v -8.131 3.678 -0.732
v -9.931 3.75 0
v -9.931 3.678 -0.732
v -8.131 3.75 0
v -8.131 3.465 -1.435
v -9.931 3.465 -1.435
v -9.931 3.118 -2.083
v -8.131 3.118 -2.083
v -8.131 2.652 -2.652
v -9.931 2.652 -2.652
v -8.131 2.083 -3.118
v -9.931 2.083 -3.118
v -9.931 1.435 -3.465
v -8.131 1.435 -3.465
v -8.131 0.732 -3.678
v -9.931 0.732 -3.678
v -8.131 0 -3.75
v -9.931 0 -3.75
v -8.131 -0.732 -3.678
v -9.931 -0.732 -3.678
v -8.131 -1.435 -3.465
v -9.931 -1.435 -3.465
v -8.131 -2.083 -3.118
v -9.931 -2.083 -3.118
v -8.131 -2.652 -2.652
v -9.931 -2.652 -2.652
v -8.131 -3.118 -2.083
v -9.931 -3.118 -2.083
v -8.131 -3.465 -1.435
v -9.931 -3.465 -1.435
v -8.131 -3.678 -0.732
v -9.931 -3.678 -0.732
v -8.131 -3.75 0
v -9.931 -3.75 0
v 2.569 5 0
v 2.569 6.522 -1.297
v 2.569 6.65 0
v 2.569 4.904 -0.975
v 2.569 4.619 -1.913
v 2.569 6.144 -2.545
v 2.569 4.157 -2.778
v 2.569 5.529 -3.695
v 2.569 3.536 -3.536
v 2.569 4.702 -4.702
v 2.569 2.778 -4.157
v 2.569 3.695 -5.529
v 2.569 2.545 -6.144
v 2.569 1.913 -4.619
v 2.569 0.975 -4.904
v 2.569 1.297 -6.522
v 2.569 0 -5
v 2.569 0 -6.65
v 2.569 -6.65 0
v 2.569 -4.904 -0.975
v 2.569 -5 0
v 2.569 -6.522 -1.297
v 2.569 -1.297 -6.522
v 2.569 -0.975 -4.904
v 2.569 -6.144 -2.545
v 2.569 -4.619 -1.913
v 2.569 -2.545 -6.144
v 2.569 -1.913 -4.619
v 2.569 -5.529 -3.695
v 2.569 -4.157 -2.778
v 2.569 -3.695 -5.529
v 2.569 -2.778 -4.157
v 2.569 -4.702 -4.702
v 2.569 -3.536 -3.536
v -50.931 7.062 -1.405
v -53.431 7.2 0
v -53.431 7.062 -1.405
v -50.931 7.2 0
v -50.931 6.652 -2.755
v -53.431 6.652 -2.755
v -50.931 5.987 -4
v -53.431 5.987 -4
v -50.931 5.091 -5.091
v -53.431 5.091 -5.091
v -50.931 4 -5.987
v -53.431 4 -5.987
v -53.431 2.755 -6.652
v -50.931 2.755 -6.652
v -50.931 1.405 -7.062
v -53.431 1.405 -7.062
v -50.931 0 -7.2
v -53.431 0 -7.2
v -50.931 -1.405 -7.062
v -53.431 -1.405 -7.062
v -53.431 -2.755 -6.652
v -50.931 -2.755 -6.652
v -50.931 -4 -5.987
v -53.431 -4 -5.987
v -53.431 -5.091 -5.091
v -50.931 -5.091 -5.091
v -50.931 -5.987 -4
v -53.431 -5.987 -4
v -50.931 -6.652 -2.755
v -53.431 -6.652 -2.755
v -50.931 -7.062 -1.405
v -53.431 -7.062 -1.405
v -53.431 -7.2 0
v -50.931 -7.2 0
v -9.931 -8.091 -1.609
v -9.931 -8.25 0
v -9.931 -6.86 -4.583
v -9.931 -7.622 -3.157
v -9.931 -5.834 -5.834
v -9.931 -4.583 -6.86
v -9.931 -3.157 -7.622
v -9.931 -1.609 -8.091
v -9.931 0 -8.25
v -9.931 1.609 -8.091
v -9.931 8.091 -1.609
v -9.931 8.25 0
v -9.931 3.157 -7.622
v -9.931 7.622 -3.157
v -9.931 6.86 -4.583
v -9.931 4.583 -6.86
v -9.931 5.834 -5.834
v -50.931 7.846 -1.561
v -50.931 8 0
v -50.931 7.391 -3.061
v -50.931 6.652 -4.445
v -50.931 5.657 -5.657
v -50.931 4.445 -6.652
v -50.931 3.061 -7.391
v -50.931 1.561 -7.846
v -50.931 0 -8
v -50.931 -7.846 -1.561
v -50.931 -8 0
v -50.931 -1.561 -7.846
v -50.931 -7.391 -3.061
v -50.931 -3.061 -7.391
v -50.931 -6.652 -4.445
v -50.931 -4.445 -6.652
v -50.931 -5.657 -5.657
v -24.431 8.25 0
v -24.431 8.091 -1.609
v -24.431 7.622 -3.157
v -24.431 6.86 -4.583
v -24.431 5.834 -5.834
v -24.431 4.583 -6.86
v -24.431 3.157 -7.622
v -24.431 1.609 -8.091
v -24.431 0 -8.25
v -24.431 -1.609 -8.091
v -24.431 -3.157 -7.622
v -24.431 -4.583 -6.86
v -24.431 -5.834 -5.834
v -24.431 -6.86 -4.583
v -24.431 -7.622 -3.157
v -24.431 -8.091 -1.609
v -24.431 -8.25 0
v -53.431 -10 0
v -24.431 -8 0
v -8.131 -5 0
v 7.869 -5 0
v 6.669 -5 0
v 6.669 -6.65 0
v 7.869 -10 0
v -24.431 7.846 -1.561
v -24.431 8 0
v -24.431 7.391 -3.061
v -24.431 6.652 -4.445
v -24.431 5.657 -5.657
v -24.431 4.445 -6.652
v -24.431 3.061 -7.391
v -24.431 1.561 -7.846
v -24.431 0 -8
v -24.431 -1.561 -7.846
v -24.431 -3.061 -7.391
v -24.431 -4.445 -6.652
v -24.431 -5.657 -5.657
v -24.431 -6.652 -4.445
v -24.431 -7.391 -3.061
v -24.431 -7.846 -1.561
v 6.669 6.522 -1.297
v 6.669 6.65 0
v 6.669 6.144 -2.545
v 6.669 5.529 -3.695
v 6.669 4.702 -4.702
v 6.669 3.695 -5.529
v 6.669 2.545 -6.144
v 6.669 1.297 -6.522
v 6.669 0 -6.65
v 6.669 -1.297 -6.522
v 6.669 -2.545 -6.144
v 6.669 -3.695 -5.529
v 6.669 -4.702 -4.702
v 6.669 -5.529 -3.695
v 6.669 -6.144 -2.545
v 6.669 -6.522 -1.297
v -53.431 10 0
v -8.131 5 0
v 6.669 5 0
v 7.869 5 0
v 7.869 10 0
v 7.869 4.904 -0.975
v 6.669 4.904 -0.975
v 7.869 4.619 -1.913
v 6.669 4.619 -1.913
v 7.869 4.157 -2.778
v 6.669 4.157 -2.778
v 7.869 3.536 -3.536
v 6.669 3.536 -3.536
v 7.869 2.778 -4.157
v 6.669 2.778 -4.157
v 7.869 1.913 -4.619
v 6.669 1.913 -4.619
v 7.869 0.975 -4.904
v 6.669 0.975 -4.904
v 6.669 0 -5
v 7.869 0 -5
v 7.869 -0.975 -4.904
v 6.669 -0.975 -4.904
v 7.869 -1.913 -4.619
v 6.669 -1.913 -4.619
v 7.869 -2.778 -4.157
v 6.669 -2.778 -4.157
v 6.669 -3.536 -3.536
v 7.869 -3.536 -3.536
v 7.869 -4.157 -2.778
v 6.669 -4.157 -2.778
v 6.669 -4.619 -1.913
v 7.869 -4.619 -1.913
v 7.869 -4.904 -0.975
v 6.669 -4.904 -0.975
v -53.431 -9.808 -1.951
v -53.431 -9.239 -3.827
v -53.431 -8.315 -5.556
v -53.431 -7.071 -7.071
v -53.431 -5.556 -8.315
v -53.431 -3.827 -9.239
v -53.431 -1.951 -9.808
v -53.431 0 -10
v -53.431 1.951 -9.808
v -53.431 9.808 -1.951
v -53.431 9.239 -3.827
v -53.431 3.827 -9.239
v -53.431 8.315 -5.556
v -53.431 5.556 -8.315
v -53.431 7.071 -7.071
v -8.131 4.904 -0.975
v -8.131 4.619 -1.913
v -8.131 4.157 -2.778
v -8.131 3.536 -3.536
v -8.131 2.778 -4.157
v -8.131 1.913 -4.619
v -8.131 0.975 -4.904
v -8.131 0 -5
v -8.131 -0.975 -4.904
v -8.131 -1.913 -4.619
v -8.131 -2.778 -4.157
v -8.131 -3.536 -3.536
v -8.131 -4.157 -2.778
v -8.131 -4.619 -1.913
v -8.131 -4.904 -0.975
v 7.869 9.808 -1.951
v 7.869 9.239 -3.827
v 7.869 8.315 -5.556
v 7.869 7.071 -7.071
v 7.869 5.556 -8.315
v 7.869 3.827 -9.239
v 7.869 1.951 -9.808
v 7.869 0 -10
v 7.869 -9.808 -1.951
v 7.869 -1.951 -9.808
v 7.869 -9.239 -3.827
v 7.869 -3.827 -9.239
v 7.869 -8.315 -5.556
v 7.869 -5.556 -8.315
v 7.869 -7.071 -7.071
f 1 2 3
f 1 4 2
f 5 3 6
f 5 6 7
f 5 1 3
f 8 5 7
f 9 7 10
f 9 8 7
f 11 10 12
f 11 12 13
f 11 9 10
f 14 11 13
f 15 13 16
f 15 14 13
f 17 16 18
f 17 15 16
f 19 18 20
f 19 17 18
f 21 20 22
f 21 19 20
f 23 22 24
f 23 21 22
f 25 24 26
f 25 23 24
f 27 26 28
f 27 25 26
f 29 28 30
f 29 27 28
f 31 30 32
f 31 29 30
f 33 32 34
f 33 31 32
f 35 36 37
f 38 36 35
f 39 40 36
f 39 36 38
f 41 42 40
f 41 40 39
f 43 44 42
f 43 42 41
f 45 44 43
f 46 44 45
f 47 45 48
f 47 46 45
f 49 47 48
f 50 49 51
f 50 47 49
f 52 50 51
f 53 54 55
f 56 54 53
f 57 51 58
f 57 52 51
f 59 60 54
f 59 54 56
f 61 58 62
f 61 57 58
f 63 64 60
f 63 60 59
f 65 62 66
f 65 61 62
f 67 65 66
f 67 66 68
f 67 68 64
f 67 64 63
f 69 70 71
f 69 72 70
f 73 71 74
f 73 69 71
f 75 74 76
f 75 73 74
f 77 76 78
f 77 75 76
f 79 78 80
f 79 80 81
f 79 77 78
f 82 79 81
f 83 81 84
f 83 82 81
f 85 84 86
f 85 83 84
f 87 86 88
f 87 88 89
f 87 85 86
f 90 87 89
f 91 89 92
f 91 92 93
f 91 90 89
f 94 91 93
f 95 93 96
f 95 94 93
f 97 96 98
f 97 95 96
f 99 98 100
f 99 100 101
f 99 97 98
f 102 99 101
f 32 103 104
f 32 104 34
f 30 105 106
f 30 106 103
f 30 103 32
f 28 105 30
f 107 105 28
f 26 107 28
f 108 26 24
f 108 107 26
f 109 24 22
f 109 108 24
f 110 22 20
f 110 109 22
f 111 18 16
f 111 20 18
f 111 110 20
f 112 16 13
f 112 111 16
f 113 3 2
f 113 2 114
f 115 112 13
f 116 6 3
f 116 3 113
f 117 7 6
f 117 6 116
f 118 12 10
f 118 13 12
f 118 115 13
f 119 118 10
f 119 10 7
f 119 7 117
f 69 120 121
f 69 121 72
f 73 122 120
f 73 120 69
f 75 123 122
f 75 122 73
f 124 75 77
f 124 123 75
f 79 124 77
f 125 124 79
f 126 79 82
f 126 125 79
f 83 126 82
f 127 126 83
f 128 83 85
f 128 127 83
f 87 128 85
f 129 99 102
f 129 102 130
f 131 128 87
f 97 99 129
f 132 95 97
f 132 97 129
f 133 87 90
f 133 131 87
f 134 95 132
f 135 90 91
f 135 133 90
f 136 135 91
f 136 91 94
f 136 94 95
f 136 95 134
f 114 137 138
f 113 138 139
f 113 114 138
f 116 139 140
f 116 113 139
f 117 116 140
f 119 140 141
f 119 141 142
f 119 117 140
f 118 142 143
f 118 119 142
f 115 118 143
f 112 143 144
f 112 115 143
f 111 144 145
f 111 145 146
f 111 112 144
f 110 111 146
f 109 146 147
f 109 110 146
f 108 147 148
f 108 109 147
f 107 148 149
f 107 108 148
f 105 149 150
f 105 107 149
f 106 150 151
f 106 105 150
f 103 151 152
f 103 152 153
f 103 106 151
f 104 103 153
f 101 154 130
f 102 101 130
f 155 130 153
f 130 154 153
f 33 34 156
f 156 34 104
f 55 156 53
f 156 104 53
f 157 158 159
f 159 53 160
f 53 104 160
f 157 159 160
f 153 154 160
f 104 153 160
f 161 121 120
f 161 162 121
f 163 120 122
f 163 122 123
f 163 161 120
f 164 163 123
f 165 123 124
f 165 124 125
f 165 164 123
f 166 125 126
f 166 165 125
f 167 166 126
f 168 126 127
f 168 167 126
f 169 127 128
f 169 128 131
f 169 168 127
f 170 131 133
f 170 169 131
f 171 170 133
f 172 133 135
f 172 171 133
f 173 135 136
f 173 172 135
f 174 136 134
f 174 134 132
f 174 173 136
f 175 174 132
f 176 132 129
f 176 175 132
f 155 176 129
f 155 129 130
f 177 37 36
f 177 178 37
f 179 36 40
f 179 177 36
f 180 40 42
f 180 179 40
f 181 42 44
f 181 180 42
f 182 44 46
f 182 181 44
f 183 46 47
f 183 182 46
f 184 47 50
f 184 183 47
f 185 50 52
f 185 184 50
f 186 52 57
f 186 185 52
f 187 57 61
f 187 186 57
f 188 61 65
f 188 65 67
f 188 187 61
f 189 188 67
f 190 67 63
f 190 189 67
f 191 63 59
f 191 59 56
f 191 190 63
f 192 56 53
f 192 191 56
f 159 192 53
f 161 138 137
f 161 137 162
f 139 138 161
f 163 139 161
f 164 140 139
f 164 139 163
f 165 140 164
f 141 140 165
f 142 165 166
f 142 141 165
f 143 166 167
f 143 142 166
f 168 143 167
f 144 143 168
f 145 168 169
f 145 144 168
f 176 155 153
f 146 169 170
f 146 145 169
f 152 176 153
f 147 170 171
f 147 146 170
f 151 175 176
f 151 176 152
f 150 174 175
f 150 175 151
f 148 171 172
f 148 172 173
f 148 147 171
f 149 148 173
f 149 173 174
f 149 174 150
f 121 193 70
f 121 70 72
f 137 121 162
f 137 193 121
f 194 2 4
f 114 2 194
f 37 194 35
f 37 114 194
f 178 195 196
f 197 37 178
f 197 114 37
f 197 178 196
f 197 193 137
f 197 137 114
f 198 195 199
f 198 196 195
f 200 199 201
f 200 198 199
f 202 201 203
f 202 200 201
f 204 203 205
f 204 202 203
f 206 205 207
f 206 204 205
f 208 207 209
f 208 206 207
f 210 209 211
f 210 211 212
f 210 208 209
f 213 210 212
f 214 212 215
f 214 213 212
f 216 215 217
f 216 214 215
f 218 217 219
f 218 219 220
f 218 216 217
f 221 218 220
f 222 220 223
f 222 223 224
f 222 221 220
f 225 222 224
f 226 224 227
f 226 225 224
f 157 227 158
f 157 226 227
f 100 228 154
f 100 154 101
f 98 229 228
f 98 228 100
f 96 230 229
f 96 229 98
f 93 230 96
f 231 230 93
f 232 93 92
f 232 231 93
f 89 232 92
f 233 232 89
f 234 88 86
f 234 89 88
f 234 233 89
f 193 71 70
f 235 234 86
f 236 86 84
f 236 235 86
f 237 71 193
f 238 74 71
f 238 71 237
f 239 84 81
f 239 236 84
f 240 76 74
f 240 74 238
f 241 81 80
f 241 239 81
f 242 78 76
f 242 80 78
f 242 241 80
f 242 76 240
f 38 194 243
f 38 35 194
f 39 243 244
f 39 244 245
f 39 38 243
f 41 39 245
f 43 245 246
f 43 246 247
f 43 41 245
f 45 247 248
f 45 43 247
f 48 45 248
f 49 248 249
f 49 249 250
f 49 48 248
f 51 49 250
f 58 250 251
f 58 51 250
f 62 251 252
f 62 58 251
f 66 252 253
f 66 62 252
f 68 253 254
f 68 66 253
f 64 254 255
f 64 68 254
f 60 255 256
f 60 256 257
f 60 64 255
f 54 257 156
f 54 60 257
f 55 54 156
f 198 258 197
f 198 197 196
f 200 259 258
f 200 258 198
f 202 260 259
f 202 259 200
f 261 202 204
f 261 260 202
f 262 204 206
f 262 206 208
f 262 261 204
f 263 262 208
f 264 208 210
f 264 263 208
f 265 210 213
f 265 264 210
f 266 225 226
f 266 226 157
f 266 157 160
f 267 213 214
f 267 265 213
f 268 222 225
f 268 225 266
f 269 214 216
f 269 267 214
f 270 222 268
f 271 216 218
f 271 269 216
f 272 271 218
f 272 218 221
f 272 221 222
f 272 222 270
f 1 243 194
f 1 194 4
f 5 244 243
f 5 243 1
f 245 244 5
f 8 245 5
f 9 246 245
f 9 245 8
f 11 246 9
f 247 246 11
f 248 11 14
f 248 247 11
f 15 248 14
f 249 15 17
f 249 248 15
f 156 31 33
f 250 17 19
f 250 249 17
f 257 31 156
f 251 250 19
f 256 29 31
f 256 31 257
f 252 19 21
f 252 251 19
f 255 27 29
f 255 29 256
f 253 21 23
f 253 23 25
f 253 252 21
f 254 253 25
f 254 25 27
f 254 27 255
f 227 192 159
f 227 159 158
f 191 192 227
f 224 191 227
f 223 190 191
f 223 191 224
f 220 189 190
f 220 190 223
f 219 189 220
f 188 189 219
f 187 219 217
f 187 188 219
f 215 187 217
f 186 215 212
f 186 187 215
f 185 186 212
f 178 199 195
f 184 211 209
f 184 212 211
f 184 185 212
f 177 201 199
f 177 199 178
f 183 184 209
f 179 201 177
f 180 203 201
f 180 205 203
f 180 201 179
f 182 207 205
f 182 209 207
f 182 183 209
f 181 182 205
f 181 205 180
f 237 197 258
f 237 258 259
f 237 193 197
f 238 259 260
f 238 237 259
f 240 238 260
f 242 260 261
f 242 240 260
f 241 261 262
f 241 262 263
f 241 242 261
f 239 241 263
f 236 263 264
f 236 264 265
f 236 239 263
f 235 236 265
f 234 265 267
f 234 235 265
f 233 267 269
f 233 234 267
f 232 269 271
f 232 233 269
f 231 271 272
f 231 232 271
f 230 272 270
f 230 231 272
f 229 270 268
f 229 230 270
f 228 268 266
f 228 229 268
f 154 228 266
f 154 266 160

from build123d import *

# Parameters (mm, degrees)
F1_ANGLE = 180


with BuildPart() as f1:
    # F0 (on Top) → F1 (revolve)
    with BuildSketch(Plane.XY):
        Polygon((-9.93075, 8.25), (-9.93075, 3.75), (-8.13075, 3.75), (-8.13075, 5), (2.56925, 5), (2.56925, 6.65), (6.66925, 6.65), (6.66925, 5), (7.86925, 5), (7.86925, 10), (-8.13075, 10), (-53.43075, 10), (-53.43075, 7.2), (-50.93075, 7.2), (-50.93075, 8), (-24.43075, 8), (-24.43075, 8.25), align=None)
    revolve(axis=Axis((-13.705372, 0, 0), (-1, 0, 0)), revolution_arc=F1_ANGLE)


solid = f1.part
